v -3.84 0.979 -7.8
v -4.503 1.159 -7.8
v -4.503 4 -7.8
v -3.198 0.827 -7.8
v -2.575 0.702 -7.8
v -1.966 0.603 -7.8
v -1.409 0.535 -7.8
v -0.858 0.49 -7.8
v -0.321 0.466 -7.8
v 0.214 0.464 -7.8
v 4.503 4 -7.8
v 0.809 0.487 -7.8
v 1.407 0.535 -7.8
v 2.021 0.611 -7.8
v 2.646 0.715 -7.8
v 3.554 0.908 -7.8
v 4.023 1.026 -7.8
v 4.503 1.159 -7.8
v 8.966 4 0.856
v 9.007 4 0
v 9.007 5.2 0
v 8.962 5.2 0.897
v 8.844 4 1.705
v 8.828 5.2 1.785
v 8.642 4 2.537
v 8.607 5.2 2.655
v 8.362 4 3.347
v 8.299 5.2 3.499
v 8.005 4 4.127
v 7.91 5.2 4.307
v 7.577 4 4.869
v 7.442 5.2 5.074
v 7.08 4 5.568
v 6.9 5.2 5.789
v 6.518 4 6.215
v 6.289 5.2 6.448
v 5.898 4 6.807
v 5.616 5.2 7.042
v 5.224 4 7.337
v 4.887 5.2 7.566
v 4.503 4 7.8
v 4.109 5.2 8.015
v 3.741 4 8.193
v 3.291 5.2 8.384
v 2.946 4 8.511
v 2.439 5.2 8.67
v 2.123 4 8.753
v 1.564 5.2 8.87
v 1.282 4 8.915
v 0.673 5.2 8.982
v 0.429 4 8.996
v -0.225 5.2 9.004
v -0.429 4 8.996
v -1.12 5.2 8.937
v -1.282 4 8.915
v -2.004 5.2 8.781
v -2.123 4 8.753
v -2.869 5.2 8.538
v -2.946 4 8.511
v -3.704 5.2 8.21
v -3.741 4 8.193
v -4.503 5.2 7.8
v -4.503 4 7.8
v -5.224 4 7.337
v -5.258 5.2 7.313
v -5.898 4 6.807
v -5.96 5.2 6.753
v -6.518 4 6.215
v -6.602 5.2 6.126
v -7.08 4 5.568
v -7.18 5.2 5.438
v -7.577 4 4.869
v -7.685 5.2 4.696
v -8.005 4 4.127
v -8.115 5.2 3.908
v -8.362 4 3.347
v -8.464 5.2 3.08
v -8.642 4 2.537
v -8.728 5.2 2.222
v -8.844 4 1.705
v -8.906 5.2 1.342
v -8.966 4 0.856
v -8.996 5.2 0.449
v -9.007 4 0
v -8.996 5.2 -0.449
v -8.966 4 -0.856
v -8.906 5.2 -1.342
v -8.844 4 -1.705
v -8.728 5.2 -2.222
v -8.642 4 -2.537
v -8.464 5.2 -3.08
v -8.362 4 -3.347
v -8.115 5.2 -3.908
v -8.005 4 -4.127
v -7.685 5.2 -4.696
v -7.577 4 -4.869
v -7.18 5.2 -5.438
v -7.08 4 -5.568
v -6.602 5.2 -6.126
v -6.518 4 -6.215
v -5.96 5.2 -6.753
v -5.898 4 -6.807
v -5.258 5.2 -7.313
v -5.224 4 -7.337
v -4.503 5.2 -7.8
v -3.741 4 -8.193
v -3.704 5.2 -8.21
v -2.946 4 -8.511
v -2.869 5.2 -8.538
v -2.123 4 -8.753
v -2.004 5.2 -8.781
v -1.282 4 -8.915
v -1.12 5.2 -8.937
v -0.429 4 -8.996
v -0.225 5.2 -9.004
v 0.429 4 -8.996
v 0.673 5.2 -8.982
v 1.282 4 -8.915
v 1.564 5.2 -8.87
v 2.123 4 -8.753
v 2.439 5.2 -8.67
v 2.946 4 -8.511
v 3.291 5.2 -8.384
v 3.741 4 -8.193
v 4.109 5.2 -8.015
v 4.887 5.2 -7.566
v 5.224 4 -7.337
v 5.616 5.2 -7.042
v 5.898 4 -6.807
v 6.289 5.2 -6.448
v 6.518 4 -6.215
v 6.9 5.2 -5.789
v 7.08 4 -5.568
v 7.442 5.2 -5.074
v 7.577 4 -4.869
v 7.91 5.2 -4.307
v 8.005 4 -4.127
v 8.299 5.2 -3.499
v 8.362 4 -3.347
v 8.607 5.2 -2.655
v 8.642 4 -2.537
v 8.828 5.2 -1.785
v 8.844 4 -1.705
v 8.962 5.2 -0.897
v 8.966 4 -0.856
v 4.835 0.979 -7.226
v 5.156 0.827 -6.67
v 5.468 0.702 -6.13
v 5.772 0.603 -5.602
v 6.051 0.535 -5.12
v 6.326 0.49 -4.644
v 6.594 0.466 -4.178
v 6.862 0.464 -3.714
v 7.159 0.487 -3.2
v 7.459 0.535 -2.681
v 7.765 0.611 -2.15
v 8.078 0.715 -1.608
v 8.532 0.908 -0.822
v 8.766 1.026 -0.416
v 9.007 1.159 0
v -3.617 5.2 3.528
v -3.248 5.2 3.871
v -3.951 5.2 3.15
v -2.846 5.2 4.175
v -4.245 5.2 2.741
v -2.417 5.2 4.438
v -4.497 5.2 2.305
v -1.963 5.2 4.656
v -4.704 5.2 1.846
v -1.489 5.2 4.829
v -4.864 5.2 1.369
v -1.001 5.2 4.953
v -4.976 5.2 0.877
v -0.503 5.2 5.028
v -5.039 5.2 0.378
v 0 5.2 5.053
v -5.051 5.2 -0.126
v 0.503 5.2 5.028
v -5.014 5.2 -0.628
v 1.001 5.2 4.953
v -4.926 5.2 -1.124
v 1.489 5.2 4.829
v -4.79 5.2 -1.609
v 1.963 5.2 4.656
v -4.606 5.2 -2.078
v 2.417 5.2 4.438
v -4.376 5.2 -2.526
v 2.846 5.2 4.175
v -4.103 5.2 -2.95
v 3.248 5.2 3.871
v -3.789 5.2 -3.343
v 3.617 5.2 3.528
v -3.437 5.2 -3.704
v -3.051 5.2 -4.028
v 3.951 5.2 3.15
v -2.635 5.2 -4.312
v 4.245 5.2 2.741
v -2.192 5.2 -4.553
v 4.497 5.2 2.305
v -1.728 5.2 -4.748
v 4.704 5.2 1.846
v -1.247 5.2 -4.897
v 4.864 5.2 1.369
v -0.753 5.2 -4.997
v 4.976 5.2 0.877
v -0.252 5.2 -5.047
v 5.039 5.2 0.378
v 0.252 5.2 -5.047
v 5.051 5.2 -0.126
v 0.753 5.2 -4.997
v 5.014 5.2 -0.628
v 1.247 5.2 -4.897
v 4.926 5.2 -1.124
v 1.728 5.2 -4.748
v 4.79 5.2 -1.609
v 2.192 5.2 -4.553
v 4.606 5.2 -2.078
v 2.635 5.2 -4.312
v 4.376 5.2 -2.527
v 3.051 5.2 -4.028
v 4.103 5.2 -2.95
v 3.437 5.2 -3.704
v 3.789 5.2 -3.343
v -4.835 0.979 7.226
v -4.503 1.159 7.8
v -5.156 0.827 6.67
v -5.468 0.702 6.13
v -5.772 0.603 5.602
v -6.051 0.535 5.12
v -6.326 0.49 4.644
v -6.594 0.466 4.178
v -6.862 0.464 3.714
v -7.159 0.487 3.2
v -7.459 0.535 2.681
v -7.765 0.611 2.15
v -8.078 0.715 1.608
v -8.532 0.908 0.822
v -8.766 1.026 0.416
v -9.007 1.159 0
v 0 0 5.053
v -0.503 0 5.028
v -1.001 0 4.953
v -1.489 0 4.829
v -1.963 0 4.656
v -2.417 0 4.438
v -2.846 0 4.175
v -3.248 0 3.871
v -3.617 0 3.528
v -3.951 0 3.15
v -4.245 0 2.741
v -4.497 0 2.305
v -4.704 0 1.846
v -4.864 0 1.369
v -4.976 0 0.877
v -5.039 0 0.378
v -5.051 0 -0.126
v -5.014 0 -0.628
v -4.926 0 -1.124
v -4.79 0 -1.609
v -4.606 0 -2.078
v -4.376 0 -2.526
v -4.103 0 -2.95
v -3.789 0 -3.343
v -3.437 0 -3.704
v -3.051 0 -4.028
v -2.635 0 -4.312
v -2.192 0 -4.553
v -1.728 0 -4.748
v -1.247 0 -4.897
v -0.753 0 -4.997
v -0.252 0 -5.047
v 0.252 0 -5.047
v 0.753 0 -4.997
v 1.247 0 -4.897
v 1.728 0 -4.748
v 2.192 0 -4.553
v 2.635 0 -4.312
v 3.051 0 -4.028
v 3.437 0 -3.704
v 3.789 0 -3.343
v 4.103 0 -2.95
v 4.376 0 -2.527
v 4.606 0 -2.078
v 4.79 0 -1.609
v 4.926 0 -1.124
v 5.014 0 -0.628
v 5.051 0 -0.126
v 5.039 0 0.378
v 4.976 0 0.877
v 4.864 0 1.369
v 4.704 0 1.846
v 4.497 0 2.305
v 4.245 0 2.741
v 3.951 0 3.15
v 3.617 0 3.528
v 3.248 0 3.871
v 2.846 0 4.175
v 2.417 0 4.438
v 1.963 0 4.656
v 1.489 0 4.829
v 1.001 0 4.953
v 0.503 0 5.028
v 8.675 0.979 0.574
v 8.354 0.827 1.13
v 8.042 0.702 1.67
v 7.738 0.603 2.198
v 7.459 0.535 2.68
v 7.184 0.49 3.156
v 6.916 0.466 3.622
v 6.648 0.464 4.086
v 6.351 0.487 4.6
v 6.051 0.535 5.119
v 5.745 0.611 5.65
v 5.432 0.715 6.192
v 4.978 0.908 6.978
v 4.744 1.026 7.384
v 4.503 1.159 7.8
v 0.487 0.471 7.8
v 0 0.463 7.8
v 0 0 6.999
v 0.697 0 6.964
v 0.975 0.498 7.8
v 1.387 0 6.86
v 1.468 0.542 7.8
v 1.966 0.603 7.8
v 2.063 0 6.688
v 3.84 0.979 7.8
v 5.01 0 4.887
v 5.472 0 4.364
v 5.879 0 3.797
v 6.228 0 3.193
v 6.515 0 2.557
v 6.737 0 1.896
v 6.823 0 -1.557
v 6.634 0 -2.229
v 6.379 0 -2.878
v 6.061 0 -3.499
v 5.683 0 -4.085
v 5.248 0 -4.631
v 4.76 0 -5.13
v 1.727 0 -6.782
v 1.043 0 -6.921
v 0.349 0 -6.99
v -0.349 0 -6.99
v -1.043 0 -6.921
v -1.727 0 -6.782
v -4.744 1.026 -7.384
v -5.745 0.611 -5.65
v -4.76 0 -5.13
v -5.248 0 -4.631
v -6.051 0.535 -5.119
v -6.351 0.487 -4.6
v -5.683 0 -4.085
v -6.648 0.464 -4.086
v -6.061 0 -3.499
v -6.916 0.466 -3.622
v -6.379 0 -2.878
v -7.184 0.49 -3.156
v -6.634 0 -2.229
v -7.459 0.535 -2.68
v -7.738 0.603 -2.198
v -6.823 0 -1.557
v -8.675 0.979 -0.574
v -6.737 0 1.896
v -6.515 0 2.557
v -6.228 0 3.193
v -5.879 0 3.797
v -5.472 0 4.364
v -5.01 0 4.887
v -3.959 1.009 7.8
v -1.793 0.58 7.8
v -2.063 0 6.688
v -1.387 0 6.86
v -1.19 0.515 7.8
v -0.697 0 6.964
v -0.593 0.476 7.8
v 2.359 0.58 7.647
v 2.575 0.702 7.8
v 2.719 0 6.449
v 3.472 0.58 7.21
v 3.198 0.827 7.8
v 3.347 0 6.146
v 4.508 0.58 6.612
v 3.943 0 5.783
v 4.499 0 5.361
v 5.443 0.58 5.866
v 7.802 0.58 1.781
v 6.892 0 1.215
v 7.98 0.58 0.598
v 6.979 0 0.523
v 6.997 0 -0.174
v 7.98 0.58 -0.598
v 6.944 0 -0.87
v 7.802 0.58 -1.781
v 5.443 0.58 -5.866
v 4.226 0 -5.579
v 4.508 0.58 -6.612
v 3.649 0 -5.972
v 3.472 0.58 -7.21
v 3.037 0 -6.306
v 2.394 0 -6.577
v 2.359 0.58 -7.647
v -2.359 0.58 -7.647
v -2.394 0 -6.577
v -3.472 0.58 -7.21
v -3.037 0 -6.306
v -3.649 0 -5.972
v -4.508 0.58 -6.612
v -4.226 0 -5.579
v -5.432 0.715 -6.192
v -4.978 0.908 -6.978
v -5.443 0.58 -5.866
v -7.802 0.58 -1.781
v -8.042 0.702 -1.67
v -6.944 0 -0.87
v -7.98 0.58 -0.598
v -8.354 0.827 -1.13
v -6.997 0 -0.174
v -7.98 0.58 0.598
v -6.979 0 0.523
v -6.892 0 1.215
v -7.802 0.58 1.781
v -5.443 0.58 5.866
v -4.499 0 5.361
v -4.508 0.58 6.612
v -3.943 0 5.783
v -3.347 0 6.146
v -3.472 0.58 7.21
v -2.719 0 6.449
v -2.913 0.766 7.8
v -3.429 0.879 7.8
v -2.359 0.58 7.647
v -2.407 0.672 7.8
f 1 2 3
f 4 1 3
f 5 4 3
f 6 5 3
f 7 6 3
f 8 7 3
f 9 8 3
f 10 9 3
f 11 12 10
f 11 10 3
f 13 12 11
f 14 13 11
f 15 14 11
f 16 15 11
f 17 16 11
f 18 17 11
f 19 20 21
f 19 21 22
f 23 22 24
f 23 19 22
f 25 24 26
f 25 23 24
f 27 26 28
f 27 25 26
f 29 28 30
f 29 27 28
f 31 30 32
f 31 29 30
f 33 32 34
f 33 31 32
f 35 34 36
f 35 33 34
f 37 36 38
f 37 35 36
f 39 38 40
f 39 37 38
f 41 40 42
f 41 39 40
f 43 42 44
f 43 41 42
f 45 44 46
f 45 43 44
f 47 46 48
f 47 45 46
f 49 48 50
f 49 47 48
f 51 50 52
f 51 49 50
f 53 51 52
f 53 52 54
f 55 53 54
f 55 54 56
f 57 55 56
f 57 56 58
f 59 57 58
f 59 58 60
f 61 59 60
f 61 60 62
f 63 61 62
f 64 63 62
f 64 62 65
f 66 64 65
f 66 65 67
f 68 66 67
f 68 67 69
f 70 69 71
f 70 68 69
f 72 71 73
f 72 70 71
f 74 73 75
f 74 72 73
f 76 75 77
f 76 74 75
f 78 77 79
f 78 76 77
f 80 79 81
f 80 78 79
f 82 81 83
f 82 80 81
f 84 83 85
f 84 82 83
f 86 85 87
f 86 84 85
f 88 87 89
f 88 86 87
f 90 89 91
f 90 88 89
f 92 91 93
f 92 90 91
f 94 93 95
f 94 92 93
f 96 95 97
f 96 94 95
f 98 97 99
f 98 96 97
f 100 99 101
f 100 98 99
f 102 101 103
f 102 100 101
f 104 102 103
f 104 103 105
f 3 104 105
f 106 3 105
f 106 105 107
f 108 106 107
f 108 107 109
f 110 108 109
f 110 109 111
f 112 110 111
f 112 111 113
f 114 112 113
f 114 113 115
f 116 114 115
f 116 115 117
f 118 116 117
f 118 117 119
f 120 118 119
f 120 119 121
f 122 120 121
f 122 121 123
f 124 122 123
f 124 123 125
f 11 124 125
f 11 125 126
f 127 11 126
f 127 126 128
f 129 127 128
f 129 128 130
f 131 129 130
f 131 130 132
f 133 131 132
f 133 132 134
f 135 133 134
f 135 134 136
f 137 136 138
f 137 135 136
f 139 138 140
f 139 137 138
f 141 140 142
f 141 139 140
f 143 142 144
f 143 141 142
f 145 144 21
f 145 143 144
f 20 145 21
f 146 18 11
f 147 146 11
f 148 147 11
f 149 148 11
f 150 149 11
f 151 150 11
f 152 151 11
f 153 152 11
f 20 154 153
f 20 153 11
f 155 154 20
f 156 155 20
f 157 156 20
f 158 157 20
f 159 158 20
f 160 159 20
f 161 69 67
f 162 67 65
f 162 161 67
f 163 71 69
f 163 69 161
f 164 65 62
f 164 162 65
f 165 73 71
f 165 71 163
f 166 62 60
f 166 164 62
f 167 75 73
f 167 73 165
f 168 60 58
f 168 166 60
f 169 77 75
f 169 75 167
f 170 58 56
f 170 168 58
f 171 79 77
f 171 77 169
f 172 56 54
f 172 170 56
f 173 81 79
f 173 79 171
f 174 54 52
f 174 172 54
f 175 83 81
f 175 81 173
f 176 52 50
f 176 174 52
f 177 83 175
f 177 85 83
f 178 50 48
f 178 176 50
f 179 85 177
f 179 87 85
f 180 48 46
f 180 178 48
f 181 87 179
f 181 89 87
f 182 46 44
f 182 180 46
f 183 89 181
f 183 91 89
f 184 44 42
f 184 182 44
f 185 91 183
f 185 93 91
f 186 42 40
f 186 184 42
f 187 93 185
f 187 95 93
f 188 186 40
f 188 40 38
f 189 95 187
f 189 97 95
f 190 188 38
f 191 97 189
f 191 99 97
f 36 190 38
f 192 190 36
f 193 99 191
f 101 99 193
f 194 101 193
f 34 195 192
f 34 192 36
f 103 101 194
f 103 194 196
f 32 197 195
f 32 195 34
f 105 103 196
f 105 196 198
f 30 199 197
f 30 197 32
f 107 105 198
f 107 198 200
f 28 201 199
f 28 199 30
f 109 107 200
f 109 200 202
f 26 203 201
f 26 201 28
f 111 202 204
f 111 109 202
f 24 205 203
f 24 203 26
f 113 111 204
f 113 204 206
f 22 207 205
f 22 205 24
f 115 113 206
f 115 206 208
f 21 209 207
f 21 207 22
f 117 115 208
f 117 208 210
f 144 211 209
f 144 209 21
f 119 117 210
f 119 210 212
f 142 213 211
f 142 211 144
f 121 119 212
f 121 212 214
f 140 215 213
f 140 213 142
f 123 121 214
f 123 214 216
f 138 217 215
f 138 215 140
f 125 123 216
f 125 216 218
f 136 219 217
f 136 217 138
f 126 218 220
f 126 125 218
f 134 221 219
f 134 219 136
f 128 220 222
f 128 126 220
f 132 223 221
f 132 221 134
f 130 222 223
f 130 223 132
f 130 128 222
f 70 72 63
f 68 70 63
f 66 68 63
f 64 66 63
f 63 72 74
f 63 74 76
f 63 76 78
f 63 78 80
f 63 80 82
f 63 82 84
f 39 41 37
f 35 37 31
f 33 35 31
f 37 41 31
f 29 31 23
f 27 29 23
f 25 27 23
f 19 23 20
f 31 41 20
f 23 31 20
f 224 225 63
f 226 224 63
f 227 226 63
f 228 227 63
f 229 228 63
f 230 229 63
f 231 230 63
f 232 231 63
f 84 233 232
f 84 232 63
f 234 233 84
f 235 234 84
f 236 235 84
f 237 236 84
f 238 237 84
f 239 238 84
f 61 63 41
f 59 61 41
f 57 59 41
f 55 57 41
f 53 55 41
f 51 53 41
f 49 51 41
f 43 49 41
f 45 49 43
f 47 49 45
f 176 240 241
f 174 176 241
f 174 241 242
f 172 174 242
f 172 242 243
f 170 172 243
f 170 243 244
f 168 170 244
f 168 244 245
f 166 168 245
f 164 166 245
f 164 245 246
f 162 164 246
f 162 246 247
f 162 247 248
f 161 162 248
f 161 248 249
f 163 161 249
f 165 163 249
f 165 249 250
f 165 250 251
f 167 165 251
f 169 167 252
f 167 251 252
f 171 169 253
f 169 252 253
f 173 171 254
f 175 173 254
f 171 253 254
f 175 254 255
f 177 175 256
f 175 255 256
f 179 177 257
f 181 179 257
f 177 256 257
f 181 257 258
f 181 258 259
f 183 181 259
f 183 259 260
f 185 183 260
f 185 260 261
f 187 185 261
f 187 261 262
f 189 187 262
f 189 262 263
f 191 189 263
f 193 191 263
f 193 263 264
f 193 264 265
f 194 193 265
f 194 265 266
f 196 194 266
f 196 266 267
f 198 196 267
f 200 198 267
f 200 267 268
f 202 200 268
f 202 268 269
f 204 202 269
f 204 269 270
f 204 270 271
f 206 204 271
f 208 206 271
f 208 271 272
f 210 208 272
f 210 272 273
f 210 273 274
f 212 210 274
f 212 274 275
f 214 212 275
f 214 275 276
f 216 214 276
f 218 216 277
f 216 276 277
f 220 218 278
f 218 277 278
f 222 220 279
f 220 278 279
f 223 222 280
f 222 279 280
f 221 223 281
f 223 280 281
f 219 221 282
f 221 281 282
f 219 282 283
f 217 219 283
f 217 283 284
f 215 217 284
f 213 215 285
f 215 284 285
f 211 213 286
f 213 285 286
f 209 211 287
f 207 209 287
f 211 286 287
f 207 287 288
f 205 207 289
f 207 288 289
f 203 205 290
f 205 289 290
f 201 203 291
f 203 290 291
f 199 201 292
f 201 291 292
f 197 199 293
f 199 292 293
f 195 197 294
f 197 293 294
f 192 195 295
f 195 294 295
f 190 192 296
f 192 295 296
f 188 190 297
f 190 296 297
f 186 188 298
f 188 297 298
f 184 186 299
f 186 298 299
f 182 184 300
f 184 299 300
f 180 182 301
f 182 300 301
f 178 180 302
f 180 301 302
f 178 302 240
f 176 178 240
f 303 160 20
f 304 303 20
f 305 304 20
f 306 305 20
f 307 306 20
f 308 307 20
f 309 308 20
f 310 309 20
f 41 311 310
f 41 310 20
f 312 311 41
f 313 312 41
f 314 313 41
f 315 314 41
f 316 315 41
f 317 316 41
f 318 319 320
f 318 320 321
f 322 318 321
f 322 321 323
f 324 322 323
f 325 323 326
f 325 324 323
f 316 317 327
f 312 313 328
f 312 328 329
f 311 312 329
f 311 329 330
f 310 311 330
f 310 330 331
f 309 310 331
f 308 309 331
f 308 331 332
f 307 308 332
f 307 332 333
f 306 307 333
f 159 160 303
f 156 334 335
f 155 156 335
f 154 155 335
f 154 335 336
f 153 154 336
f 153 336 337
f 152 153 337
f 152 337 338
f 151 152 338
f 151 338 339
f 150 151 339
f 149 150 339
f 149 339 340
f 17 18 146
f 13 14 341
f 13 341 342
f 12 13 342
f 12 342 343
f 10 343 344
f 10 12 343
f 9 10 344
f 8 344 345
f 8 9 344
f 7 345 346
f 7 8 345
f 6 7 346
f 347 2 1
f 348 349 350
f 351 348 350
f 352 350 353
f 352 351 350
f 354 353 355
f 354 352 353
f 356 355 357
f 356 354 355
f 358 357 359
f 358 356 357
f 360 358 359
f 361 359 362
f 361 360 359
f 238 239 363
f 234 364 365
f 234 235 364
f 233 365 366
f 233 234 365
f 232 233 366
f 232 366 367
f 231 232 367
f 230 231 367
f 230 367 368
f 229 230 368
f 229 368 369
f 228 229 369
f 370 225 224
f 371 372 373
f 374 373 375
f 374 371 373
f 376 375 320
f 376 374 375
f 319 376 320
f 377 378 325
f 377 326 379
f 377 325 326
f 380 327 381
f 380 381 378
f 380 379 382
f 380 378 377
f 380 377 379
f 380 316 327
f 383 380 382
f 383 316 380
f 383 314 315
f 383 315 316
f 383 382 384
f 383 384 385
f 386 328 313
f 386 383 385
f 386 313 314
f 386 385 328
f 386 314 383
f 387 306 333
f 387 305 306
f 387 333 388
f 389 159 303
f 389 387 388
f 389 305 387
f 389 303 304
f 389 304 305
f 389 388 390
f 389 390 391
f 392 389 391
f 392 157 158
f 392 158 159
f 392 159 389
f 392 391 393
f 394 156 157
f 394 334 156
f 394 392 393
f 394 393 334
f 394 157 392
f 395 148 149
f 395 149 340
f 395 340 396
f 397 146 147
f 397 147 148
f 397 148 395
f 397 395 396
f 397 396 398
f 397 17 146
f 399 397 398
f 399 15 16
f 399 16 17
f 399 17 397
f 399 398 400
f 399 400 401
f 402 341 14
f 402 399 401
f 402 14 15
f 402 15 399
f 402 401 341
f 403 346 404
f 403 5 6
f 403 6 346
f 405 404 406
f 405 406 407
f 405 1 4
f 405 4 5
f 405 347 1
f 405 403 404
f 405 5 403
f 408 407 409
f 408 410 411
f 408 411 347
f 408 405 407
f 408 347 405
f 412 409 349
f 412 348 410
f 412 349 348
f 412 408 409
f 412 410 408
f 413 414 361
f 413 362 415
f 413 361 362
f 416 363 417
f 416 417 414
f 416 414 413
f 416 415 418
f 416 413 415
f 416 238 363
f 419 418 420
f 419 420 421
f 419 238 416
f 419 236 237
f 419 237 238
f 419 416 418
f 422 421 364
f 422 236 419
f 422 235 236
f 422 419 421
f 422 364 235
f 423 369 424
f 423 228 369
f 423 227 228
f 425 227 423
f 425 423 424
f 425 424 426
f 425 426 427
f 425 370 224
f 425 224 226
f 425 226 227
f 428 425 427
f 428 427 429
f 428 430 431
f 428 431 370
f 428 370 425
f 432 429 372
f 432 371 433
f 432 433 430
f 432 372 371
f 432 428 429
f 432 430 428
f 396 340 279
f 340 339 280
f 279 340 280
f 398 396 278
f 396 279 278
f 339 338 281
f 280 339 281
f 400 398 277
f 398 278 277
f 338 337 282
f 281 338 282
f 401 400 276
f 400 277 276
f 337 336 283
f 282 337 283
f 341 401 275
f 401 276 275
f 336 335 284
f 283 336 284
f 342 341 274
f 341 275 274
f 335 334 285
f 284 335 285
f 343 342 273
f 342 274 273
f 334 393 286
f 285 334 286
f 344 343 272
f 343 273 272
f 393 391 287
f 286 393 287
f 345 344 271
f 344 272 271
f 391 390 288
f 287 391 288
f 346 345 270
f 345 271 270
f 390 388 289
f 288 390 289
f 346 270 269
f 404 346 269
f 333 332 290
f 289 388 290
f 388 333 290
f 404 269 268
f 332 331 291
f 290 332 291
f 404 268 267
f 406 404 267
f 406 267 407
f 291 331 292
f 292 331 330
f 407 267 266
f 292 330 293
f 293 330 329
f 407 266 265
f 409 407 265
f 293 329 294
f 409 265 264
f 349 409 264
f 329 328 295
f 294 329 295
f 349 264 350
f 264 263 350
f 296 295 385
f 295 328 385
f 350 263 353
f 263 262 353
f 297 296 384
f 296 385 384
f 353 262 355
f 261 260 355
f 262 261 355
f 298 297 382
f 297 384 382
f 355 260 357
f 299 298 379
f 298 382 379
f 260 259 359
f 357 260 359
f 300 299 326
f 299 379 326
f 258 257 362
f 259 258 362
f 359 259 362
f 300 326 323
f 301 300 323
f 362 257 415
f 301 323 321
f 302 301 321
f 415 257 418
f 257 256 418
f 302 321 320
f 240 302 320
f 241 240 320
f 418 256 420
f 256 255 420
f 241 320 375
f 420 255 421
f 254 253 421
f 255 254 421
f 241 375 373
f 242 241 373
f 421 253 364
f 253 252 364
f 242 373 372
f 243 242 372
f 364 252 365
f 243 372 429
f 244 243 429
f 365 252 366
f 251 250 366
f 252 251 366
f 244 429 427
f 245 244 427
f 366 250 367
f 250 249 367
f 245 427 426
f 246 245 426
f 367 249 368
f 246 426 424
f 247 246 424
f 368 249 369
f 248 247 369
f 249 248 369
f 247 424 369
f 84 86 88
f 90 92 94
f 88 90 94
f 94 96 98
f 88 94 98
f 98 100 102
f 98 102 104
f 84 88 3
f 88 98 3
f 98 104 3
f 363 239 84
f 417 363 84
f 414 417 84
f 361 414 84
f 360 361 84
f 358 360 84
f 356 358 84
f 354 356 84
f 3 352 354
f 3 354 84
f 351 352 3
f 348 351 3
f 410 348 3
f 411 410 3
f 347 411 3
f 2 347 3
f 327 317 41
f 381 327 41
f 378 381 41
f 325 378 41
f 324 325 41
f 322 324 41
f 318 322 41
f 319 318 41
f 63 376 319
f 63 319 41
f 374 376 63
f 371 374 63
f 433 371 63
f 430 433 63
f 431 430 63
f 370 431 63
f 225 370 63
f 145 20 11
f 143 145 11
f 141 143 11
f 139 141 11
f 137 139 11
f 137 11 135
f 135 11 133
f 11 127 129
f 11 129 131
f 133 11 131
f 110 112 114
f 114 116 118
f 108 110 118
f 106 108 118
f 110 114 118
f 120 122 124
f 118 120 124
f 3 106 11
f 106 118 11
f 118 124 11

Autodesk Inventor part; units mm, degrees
ref_plane "YZ Plane" through (0, 0, 0) normal (1, 0, 0) x (0, 1, 0)
ref_plane "XZ Plane" through (0, 0, 0) normal (0, 1, 0) x (-1, 0, 0)
ref_plane "XY Plane" through (0, 0, 0) normal (0, 0, 1) x (1, 0, 0)
sketch "Sketch1" plane through (0, 0, 0) normal (0, 1, 0) x (-1, 0, 0)
  line L0 (9.0067, 0) -> (4.5033, -7.8)
  line L1 (4.5033, -7.8) -> (-4.5033, -7.8)
  line L2 (-4.5033, -7.8) -> (-9.0067, 0)
  line L3 (-9.0067, 0) -> (-4.5033, 7.8)
  line L4 (-4.5033, 7.8) -> (4.5033, 7.8)
  line L5 (4.5033, 7.8) -> (9.0067, 0)
  point P0 (0, 0)
  point P1 (0, 0)
  dimension "d0" = 15.6
extrude "Extrusion1" add sketch "Sketch1" along normal blind 4
sketch "Sketch2" plane through (0, 4, 0) normal (0, 1, 0) x (1, 0, 0)
  line L0 (-4.5033, -7.8) -> (4.5033, -7.8) projected
  line L1 (4.5033, -7.8) -> (9.0067, 0) projected
  line L2 (9.0067, 0) -> (4.5033, 7.8) projected
  line L3 (4.5033, 7.8) -> (-4.5033, 7.8) projected
  line L4 (-4.5033, 7.8) -> (-9.0067, 0) projected
  line L5 (-9.0067, 0) -> (-4.5033, -7.8) projected
  circle A0 centre (0, 0) radius 9.0067
extrude "Extrusion2" add sketch "Sketch2" along normal blind 1.2
sketch "Sketch3" plane through (0, 0, 0) normal (1, 0, 0) x (0, 1, 0)
  line L0 (-4, 0.0705) -> (1.2, 9.0772)
  line L1 (-4, 0.0705) -> (6.4, 0.0705) construction
  line L2 (1.2, 9.0772) -> (-4, 9.0772)
  line L3 (-4, 9.0772) -> (-4, 0.0705)
  line L4 (0, 13.9781) -> (0, -14.7276)
  line L5 (13.4115, 0) -> (-11.0286, 0)
  point P0 (0, 0)
  dimension "d5" = 60
  dimension "d6" = 5.2
  dimension "d7" = 4
revolve "Revolution1" cut sketch "Sketch3" angle 360 about axis through (0, 13.4115, 0) along (0, -1, 0)
sketch "Sketch4" plane through (0, 5.2, 0) normal (0, 1, 0) x (1, 0, 0)
  point P0 (0, 0)
  point P1 (0, 0)
hole "Hole1" at (0, 5.2, 0) direction (0, -1, 0) diameter 10.106 end through all thread size "M12x1.75" class "6H" standard "ISO Metric profile"
properties part number "Cable Gland Lock Nut RS 822-9791"
